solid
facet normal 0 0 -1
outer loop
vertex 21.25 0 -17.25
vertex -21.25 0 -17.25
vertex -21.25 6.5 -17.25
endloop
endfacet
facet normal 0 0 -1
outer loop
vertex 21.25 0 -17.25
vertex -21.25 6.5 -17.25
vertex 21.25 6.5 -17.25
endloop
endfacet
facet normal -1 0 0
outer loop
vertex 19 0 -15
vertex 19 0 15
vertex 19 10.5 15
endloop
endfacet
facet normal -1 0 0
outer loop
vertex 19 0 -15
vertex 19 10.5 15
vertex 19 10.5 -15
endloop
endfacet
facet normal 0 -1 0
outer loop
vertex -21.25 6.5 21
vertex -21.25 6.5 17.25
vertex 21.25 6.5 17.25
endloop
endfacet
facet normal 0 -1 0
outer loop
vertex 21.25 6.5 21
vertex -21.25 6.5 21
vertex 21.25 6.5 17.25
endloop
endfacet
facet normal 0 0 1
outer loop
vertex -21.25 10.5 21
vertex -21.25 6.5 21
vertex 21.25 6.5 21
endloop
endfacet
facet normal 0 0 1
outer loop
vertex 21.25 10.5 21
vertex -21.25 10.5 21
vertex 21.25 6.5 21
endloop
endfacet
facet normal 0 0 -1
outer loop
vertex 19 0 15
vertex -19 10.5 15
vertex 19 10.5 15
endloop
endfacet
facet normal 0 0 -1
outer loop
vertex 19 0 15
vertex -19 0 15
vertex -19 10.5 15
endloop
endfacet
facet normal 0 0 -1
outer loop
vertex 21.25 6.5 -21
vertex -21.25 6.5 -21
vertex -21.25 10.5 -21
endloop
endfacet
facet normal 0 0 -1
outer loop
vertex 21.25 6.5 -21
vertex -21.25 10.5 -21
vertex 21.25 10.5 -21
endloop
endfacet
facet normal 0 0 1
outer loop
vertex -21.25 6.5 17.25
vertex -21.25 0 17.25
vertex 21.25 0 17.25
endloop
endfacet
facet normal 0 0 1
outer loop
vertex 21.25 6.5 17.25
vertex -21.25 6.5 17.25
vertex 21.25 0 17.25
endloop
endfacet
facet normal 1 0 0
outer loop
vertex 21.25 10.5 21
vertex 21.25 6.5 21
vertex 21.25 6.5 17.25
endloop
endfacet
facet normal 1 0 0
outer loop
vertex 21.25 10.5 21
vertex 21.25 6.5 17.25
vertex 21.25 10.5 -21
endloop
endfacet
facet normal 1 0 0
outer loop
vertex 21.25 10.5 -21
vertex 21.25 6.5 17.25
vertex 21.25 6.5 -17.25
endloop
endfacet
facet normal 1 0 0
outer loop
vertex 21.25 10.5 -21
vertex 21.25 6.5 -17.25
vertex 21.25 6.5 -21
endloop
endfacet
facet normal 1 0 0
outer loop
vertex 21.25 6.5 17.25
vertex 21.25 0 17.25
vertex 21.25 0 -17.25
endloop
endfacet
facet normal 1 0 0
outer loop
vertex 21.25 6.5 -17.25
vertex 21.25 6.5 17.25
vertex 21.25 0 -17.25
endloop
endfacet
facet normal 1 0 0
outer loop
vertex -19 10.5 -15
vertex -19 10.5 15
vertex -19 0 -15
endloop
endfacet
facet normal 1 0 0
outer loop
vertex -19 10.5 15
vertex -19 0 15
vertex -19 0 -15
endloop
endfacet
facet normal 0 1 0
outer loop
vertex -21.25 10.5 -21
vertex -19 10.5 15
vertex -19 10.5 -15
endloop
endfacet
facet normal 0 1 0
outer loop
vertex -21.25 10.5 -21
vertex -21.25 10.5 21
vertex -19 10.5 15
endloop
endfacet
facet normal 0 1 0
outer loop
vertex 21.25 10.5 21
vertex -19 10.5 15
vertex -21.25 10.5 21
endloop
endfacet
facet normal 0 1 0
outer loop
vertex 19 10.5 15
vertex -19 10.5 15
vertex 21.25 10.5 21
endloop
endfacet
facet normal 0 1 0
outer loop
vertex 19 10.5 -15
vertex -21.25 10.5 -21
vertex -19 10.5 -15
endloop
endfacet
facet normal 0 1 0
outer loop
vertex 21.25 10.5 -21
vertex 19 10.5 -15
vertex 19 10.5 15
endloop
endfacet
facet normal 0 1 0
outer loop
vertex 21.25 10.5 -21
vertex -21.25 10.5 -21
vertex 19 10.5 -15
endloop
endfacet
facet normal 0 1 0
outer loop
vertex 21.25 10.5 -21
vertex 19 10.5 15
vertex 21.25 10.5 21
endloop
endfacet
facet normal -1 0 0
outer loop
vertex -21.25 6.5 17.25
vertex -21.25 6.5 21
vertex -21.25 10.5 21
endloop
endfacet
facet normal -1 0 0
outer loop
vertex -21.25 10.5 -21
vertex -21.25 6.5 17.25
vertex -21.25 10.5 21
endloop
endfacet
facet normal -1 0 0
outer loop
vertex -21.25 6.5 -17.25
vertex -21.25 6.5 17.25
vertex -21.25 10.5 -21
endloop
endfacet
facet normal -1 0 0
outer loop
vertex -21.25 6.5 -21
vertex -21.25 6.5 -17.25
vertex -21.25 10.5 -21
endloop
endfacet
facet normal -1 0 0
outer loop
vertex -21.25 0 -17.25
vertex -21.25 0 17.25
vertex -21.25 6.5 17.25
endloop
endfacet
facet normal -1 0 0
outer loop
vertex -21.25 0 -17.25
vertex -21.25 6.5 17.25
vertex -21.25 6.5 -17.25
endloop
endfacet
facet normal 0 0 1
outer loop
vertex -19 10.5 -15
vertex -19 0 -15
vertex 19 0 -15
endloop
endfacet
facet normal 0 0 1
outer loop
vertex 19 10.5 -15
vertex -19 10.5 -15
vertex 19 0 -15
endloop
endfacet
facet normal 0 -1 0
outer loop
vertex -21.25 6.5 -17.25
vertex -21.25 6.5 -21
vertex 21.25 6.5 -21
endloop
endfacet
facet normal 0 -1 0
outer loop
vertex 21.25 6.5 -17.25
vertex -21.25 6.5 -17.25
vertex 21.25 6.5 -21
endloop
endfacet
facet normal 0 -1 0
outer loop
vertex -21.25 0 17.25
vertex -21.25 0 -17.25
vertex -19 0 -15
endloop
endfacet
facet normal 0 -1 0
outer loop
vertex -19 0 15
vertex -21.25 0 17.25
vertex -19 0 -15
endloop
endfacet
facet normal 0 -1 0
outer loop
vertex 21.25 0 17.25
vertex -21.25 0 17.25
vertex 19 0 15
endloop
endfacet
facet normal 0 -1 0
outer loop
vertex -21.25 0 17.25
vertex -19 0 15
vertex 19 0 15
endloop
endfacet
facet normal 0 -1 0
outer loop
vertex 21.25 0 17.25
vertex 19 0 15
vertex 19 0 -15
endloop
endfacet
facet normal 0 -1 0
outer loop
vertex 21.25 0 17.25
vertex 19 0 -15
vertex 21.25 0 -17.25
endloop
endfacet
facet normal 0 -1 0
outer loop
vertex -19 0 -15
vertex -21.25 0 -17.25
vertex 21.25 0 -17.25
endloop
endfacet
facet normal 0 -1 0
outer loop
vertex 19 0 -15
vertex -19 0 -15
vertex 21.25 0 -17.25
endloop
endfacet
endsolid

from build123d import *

# Parameters (mm, degrees)
SKETCH_1_W      = 42.5
SKETCH_1_H      = 34.5
SKETCH_1_W_2    = 38
SKETCH_1_H_2    = 30
EXTRUDE_1_DEPTH = 6.5
SKETCH_2_W      = 42.5
SKETCH_2_H      = 42
SKETCH_2_W_2    = 38
SKETCH_2_H_2    = 30
EXTRUDE_2_DEPTH = 4


with BuildPart() as part:
    # Эскиз1 → Бобышка-Вытянуть1 (new body)
    with BuildSketch(Plane(origin=(0, 0, 0), x_dir=(1, 0, 0), z_dir=(0, 1, 0))):
        Rectangle(SKETCH_1_W, SKETCH_1_H)
        Rectangle(SKETCH_1_W_2, SKETCH_1_H_2, mode=Mode.SUBTRACT)
    extrude(amount=EXTRUDE_1_DEPTH)

    # Эскиз2 → Бобышка-Вытянуть2 (add)
    with BuildSketch(Plane(origin=(0, 6.5, 0), x_dir=(1, 0, 0), z_dir=(0, 1, 0))):
        Rectangle(SKETCH_2_W, SKETCH_2_H)
        Rectangle(SKETCH_2_W_2, SKETCH_2_H_2, mode=Mode.SUBTRACT)
    extrude(amount=EXTRUDE_2_DEPTH)


solid = part.part
